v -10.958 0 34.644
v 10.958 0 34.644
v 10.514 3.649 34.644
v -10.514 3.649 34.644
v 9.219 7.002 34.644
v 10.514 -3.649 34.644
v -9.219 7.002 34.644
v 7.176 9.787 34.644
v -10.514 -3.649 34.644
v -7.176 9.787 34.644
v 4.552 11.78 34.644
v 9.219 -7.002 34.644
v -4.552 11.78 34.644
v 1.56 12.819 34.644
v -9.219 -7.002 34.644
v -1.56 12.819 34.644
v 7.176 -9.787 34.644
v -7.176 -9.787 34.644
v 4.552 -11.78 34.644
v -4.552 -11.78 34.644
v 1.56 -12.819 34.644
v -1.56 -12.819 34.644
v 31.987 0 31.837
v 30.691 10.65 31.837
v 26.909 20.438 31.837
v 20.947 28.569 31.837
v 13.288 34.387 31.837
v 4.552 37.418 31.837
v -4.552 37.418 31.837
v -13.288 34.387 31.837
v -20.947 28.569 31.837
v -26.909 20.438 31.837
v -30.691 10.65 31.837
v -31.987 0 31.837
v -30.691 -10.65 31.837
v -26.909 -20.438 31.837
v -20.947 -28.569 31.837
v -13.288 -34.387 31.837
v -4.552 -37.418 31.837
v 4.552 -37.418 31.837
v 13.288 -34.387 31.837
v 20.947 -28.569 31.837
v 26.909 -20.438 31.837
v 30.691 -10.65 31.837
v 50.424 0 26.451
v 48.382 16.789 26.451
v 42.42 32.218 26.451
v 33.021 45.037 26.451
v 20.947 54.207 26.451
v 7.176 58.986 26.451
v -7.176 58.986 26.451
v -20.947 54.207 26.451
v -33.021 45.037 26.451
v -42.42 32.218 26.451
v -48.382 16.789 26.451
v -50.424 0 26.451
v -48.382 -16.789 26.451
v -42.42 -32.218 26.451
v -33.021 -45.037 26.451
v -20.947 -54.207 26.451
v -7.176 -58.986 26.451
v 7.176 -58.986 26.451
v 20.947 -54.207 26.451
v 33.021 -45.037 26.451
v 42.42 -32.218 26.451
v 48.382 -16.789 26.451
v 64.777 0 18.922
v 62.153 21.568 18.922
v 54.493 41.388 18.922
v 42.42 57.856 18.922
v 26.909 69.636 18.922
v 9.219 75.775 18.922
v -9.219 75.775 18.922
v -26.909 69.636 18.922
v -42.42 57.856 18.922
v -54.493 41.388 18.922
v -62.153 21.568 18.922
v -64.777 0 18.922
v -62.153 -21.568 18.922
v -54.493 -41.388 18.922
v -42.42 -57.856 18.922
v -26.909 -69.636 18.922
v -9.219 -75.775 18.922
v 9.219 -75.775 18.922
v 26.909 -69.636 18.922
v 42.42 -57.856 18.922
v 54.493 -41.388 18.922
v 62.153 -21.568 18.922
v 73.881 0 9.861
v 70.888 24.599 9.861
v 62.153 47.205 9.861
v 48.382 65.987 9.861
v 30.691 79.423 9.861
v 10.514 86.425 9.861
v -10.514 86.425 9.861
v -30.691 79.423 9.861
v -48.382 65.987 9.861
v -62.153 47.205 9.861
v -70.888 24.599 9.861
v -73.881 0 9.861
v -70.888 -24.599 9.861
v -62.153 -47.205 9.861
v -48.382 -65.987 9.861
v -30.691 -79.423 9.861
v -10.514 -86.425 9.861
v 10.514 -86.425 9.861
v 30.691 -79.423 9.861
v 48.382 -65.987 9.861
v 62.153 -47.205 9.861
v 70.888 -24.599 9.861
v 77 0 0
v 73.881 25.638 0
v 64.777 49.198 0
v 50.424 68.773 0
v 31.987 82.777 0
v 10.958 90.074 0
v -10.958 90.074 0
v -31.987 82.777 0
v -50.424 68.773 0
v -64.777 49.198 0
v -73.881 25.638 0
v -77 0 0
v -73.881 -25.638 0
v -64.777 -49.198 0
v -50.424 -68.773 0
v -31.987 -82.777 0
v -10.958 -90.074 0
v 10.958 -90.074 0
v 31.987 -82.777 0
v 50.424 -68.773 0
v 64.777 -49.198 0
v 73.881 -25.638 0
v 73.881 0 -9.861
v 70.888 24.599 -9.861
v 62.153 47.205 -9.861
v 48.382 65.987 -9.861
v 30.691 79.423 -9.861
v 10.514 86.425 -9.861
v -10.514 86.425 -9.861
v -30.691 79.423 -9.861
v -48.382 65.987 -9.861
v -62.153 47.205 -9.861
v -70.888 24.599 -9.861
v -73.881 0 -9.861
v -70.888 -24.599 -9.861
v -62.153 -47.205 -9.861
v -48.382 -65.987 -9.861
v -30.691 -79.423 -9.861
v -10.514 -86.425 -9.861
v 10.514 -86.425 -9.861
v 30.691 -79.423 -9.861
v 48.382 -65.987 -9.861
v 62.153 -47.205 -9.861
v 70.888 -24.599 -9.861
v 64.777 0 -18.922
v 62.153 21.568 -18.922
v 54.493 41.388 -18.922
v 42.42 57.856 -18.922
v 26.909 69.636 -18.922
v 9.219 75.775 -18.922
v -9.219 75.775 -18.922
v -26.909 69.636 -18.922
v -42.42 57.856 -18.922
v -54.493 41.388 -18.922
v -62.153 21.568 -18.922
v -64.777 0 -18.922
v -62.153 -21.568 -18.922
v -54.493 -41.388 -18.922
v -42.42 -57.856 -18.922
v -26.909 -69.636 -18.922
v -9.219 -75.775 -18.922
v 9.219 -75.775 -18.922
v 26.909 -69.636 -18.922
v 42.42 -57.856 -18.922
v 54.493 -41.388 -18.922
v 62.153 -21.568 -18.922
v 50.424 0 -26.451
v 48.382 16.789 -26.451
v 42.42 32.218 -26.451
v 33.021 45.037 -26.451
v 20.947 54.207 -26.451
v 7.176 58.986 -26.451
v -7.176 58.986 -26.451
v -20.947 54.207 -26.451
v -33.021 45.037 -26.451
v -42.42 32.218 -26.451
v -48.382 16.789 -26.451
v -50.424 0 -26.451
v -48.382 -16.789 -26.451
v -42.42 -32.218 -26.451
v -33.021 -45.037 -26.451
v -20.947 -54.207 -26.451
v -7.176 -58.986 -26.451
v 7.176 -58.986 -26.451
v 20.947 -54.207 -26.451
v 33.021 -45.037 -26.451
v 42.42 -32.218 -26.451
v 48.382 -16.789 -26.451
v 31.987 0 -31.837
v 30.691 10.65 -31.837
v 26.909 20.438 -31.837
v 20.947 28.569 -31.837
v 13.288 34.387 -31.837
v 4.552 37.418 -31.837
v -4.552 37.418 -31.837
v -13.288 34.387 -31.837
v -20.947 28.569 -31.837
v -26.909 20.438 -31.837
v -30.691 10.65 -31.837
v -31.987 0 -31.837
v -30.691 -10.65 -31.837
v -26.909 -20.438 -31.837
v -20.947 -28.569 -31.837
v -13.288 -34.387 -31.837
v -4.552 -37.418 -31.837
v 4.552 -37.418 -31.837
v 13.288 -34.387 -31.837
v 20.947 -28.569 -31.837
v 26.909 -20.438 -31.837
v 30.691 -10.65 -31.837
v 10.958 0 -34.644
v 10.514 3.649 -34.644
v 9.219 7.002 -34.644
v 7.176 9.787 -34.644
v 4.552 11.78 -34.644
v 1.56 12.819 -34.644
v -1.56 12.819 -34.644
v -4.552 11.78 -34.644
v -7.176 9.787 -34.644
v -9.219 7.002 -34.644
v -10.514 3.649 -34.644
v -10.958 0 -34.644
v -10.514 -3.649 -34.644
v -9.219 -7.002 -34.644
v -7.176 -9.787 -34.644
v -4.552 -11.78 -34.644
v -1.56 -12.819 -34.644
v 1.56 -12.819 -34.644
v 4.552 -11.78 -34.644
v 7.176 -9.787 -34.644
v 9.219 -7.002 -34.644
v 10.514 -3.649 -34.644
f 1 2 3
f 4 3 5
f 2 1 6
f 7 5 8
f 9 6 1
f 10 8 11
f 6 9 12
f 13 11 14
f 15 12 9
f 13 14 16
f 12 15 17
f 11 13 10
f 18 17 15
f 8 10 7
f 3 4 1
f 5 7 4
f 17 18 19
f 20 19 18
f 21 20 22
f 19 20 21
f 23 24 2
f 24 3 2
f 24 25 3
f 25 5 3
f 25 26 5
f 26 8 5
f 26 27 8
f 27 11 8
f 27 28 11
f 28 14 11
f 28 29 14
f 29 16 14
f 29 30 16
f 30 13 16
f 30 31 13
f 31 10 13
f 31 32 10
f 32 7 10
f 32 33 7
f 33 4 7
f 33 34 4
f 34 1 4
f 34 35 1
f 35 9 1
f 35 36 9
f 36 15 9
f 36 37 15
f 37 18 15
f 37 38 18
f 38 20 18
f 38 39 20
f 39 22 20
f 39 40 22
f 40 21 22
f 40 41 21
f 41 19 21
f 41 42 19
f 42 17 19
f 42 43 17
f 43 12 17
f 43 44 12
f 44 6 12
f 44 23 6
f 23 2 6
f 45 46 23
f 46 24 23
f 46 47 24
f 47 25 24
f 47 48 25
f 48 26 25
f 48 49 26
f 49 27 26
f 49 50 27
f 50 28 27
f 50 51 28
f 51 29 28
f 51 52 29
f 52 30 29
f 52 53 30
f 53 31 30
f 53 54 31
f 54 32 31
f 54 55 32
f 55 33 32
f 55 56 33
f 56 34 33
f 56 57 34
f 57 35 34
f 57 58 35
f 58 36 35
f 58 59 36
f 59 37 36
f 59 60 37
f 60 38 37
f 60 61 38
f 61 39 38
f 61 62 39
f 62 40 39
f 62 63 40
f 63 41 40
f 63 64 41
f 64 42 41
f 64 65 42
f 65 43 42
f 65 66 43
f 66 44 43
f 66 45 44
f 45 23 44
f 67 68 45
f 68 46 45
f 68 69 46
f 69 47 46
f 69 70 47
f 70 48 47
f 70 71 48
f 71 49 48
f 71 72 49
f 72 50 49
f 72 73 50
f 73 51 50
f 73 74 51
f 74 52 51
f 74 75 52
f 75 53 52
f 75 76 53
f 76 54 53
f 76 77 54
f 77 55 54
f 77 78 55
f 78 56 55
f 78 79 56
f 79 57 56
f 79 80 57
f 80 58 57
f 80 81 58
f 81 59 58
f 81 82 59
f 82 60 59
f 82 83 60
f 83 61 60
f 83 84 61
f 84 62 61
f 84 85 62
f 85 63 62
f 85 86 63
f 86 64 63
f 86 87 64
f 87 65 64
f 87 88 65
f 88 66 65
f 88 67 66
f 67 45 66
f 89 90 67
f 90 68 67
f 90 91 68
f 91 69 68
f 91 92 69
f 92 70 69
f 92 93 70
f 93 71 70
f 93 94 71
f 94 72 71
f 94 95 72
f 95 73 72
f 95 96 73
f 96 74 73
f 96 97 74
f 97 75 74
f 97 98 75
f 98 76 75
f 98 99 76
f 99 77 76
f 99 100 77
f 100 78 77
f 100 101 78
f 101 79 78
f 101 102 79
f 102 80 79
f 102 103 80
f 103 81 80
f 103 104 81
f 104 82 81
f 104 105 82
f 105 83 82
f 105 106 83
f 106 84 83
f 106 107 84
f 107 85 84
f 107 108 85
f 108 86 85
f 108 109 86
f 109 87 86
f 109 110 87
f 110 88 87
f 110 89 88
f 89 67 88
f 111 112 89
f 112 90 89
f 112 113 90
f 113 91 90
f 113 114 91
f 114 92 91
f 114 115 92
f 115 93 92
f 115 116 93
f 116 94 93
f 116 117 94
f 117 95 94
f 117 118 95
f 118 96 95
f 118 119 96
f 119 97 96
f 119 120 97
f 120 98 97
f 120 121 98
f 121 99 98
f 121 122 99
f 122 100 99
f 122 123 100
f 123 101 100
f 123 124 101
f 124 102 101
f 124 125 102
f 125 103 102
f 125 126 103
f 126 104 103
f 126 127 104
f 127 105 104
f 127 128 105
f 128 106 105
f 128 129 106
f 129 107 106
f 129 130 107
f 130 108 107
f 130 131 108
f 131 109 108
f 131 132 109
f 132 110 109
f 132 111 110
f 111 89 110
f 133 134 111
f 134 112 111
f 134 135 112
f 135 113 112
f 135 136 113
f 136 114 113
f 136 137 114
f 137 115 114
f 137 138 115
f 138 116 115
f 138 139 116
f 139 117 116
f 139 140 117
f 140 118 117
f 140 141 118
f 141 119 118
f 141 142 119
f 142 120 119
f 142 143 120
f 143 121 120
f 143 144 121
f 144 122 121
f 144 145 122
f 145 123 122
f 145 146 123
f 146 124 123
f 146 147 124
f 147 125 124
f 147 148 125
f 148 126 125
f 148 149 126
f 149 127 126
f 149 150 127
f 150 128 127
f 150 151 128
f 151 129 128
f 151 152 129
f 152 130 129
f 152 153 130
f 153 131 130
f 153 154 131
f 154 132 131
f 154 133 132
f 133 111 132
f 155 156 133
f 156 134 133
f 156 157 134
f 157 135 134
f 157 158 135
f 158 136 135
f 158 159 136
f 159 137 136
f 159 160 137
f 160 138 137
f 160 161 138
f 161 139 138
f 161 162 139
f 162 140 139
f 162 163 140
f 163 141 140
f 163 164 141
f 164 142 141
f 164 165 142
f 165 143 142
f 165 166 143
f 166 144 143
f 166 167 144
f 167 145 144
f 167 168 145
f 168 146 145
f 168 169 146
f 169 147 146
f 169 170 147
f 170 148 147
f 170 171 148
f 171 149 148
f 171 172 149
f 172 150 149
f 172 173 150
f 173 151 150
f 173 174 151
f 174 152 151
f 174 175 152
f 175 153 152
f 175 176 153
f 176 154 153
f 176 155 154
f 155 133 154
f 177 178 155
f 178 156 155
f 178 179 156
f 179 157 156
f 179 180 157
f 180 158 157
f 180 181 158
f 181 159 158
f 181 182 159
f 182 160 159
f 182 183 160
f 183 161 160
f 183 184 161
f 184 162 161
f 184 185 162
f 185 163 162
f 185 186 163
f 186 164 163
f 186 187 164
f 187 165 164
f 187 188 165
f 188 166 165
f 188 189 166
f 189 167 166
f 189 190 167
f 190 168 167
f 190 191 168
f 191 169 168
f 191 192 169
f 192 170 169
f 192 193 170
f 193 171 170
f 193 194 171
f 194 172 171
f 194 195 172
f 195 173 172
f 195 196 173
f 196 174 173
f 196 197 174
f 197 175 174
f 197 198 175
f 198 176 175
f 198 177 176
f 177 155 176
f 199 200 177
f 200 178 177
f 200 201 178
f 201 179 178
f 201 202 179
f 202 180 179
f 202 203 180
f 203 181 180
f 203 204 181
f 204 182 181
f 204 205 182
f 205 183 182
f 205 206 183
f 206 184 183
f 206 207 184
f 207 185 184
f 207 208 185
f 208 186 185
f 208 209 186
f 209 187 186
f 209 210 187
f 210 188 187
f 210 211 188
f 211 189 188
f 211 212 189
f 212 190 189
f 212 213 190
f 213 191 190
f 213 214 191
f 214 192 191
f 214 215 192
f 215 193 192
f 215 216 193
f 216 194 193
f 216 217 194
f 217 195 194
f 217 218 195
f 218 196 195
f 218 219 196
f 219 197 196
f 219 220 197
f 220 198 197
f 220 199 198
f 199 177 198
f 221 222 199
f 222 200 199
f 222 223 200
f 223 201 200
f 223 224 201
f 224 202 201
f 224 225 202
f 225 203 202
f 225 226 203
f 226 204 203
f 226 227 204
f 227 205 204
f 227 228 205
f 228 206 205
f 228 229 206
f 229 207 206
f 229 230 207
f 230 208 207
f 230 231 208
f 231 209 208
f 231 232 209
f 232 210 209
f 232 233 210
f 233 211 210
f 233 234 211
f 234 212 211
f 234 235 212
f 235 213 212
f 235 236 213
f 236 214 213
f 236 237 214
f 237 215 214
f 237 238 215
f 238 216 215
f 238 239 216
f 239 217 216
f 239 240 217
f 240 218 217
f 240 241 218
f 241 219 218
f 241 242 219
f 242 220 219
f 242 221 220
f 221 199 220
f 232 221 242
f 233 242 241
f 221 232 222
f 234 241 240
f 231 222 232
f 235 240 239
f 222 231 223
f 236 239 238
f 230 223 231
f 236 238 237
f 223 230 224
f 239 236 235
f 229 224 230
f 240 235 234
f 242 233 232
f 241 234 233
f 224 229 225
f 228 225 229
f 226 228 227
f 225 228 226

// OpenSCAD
// Generated by SolidPython 1.0.1 on 2020-07-29 00:46:49


scale(v = [11, 13, 5]) {
	sphere(r = 7);
}
/***********************************************
*********      SolidPython code:      **********
************************************************
 
# import packages: SolidPython
from solid import *
from solid.utils import *
from itertools import chain, combinations, permutations


class Resize:

    def __init__(self, scad_file):
        self.scad_file = scad_file
        #self.scad_file = import_scad(scad_file)
        # cone/cylinder param:
        self.r1 = 0
        self.r2 = 0
        self.h = 0
        # rectangular prism param:
        self.w = 0
        self.l = 0
        # ellipse param:
        self.r = 0

    # import OpenScad code (file name corresponds to shape)


    # classify shape + parameters
    def assign(self, param1, param2, param3):
        if self.scad_file == 'cone.scad':
            self.r1 = param1
            self.r2 = param2
            self.h = param3
        elif self.scad_file == 'cylinder.scad':
            self.r1 = param1
            self.r2 = param2
            self.h = param3
        elif self.scad_file == 'rectangularPrism.scad':
            self.h = param1
            self.l = param2
            self.w = param3
        else:
            self.r = param1
            self.h = param2

    # resize parameters
    def iterate(self):
        x = range(3, 20, 2)
        i = 1
        if self.scad_file == 'cone.scad':
            tempList = list(permutations(x, 2))
            for temp in tempList:
                param1 = temp[0]
                param2 = temp[1]
                filepath = 'produced_scad_files/' + 'cone' + str(param1) + '_' + str(param2) + '_' + '.scad'
                scad_render_to_file(cylinder(h=param1, r1=param2, r2=0), filepath)

        elif self.scad_file == 'cylinder.scad':
            tempList = list(permutations(x, 3))
            for temp in tempList:
                param1 = temp[0]
                param2 = temp[1]
                filepath = 'produced_scad_files/' + 'cylinder' + str(param1) + '_' + str(param2) + '_' + '.scad'
                scad_render_to_file(cylinder(h=param1, r1=param2, r2=param2), filepath)

        elif self.scad_file == 'rectangularPrism.scad':
            tempList = list(permutations(x, 3))
            for temp in tempList:
                param1 = temp[0]
                param2 = temp[1]
                param3 = temp[2]
                filepath = 'produced_scad_files/' + 'rectangularPrism' + str(param1) + '_' + str(param2) + '_' + str(
                    param3) + '.scad'
                scad_render_to_file(cube(size=(param1, param2, param3)), filepath)

        elif self.scad_file == 'ellipse.scad':
            tempList = list(permutations(x, 4))
            for temp in tempList:
                param1 = temp[0]
                param2 = temp[1]
                param3 = temp[2]
                param4 = temp[3]
                filepath = 'produced_scad_files/' + 'ellipse' + str(param1) + '_' + str(param2) + '_' + str(param3) + '_' + str(param4) + '.scad'
                scad_render_to_file(scale([param1, param2, param3])(sphere(r=param4)), filepath)

    def render_to_scadfile(self):
        scad_render_to_file(scad, 'example.scad') 
 
************************************************/
